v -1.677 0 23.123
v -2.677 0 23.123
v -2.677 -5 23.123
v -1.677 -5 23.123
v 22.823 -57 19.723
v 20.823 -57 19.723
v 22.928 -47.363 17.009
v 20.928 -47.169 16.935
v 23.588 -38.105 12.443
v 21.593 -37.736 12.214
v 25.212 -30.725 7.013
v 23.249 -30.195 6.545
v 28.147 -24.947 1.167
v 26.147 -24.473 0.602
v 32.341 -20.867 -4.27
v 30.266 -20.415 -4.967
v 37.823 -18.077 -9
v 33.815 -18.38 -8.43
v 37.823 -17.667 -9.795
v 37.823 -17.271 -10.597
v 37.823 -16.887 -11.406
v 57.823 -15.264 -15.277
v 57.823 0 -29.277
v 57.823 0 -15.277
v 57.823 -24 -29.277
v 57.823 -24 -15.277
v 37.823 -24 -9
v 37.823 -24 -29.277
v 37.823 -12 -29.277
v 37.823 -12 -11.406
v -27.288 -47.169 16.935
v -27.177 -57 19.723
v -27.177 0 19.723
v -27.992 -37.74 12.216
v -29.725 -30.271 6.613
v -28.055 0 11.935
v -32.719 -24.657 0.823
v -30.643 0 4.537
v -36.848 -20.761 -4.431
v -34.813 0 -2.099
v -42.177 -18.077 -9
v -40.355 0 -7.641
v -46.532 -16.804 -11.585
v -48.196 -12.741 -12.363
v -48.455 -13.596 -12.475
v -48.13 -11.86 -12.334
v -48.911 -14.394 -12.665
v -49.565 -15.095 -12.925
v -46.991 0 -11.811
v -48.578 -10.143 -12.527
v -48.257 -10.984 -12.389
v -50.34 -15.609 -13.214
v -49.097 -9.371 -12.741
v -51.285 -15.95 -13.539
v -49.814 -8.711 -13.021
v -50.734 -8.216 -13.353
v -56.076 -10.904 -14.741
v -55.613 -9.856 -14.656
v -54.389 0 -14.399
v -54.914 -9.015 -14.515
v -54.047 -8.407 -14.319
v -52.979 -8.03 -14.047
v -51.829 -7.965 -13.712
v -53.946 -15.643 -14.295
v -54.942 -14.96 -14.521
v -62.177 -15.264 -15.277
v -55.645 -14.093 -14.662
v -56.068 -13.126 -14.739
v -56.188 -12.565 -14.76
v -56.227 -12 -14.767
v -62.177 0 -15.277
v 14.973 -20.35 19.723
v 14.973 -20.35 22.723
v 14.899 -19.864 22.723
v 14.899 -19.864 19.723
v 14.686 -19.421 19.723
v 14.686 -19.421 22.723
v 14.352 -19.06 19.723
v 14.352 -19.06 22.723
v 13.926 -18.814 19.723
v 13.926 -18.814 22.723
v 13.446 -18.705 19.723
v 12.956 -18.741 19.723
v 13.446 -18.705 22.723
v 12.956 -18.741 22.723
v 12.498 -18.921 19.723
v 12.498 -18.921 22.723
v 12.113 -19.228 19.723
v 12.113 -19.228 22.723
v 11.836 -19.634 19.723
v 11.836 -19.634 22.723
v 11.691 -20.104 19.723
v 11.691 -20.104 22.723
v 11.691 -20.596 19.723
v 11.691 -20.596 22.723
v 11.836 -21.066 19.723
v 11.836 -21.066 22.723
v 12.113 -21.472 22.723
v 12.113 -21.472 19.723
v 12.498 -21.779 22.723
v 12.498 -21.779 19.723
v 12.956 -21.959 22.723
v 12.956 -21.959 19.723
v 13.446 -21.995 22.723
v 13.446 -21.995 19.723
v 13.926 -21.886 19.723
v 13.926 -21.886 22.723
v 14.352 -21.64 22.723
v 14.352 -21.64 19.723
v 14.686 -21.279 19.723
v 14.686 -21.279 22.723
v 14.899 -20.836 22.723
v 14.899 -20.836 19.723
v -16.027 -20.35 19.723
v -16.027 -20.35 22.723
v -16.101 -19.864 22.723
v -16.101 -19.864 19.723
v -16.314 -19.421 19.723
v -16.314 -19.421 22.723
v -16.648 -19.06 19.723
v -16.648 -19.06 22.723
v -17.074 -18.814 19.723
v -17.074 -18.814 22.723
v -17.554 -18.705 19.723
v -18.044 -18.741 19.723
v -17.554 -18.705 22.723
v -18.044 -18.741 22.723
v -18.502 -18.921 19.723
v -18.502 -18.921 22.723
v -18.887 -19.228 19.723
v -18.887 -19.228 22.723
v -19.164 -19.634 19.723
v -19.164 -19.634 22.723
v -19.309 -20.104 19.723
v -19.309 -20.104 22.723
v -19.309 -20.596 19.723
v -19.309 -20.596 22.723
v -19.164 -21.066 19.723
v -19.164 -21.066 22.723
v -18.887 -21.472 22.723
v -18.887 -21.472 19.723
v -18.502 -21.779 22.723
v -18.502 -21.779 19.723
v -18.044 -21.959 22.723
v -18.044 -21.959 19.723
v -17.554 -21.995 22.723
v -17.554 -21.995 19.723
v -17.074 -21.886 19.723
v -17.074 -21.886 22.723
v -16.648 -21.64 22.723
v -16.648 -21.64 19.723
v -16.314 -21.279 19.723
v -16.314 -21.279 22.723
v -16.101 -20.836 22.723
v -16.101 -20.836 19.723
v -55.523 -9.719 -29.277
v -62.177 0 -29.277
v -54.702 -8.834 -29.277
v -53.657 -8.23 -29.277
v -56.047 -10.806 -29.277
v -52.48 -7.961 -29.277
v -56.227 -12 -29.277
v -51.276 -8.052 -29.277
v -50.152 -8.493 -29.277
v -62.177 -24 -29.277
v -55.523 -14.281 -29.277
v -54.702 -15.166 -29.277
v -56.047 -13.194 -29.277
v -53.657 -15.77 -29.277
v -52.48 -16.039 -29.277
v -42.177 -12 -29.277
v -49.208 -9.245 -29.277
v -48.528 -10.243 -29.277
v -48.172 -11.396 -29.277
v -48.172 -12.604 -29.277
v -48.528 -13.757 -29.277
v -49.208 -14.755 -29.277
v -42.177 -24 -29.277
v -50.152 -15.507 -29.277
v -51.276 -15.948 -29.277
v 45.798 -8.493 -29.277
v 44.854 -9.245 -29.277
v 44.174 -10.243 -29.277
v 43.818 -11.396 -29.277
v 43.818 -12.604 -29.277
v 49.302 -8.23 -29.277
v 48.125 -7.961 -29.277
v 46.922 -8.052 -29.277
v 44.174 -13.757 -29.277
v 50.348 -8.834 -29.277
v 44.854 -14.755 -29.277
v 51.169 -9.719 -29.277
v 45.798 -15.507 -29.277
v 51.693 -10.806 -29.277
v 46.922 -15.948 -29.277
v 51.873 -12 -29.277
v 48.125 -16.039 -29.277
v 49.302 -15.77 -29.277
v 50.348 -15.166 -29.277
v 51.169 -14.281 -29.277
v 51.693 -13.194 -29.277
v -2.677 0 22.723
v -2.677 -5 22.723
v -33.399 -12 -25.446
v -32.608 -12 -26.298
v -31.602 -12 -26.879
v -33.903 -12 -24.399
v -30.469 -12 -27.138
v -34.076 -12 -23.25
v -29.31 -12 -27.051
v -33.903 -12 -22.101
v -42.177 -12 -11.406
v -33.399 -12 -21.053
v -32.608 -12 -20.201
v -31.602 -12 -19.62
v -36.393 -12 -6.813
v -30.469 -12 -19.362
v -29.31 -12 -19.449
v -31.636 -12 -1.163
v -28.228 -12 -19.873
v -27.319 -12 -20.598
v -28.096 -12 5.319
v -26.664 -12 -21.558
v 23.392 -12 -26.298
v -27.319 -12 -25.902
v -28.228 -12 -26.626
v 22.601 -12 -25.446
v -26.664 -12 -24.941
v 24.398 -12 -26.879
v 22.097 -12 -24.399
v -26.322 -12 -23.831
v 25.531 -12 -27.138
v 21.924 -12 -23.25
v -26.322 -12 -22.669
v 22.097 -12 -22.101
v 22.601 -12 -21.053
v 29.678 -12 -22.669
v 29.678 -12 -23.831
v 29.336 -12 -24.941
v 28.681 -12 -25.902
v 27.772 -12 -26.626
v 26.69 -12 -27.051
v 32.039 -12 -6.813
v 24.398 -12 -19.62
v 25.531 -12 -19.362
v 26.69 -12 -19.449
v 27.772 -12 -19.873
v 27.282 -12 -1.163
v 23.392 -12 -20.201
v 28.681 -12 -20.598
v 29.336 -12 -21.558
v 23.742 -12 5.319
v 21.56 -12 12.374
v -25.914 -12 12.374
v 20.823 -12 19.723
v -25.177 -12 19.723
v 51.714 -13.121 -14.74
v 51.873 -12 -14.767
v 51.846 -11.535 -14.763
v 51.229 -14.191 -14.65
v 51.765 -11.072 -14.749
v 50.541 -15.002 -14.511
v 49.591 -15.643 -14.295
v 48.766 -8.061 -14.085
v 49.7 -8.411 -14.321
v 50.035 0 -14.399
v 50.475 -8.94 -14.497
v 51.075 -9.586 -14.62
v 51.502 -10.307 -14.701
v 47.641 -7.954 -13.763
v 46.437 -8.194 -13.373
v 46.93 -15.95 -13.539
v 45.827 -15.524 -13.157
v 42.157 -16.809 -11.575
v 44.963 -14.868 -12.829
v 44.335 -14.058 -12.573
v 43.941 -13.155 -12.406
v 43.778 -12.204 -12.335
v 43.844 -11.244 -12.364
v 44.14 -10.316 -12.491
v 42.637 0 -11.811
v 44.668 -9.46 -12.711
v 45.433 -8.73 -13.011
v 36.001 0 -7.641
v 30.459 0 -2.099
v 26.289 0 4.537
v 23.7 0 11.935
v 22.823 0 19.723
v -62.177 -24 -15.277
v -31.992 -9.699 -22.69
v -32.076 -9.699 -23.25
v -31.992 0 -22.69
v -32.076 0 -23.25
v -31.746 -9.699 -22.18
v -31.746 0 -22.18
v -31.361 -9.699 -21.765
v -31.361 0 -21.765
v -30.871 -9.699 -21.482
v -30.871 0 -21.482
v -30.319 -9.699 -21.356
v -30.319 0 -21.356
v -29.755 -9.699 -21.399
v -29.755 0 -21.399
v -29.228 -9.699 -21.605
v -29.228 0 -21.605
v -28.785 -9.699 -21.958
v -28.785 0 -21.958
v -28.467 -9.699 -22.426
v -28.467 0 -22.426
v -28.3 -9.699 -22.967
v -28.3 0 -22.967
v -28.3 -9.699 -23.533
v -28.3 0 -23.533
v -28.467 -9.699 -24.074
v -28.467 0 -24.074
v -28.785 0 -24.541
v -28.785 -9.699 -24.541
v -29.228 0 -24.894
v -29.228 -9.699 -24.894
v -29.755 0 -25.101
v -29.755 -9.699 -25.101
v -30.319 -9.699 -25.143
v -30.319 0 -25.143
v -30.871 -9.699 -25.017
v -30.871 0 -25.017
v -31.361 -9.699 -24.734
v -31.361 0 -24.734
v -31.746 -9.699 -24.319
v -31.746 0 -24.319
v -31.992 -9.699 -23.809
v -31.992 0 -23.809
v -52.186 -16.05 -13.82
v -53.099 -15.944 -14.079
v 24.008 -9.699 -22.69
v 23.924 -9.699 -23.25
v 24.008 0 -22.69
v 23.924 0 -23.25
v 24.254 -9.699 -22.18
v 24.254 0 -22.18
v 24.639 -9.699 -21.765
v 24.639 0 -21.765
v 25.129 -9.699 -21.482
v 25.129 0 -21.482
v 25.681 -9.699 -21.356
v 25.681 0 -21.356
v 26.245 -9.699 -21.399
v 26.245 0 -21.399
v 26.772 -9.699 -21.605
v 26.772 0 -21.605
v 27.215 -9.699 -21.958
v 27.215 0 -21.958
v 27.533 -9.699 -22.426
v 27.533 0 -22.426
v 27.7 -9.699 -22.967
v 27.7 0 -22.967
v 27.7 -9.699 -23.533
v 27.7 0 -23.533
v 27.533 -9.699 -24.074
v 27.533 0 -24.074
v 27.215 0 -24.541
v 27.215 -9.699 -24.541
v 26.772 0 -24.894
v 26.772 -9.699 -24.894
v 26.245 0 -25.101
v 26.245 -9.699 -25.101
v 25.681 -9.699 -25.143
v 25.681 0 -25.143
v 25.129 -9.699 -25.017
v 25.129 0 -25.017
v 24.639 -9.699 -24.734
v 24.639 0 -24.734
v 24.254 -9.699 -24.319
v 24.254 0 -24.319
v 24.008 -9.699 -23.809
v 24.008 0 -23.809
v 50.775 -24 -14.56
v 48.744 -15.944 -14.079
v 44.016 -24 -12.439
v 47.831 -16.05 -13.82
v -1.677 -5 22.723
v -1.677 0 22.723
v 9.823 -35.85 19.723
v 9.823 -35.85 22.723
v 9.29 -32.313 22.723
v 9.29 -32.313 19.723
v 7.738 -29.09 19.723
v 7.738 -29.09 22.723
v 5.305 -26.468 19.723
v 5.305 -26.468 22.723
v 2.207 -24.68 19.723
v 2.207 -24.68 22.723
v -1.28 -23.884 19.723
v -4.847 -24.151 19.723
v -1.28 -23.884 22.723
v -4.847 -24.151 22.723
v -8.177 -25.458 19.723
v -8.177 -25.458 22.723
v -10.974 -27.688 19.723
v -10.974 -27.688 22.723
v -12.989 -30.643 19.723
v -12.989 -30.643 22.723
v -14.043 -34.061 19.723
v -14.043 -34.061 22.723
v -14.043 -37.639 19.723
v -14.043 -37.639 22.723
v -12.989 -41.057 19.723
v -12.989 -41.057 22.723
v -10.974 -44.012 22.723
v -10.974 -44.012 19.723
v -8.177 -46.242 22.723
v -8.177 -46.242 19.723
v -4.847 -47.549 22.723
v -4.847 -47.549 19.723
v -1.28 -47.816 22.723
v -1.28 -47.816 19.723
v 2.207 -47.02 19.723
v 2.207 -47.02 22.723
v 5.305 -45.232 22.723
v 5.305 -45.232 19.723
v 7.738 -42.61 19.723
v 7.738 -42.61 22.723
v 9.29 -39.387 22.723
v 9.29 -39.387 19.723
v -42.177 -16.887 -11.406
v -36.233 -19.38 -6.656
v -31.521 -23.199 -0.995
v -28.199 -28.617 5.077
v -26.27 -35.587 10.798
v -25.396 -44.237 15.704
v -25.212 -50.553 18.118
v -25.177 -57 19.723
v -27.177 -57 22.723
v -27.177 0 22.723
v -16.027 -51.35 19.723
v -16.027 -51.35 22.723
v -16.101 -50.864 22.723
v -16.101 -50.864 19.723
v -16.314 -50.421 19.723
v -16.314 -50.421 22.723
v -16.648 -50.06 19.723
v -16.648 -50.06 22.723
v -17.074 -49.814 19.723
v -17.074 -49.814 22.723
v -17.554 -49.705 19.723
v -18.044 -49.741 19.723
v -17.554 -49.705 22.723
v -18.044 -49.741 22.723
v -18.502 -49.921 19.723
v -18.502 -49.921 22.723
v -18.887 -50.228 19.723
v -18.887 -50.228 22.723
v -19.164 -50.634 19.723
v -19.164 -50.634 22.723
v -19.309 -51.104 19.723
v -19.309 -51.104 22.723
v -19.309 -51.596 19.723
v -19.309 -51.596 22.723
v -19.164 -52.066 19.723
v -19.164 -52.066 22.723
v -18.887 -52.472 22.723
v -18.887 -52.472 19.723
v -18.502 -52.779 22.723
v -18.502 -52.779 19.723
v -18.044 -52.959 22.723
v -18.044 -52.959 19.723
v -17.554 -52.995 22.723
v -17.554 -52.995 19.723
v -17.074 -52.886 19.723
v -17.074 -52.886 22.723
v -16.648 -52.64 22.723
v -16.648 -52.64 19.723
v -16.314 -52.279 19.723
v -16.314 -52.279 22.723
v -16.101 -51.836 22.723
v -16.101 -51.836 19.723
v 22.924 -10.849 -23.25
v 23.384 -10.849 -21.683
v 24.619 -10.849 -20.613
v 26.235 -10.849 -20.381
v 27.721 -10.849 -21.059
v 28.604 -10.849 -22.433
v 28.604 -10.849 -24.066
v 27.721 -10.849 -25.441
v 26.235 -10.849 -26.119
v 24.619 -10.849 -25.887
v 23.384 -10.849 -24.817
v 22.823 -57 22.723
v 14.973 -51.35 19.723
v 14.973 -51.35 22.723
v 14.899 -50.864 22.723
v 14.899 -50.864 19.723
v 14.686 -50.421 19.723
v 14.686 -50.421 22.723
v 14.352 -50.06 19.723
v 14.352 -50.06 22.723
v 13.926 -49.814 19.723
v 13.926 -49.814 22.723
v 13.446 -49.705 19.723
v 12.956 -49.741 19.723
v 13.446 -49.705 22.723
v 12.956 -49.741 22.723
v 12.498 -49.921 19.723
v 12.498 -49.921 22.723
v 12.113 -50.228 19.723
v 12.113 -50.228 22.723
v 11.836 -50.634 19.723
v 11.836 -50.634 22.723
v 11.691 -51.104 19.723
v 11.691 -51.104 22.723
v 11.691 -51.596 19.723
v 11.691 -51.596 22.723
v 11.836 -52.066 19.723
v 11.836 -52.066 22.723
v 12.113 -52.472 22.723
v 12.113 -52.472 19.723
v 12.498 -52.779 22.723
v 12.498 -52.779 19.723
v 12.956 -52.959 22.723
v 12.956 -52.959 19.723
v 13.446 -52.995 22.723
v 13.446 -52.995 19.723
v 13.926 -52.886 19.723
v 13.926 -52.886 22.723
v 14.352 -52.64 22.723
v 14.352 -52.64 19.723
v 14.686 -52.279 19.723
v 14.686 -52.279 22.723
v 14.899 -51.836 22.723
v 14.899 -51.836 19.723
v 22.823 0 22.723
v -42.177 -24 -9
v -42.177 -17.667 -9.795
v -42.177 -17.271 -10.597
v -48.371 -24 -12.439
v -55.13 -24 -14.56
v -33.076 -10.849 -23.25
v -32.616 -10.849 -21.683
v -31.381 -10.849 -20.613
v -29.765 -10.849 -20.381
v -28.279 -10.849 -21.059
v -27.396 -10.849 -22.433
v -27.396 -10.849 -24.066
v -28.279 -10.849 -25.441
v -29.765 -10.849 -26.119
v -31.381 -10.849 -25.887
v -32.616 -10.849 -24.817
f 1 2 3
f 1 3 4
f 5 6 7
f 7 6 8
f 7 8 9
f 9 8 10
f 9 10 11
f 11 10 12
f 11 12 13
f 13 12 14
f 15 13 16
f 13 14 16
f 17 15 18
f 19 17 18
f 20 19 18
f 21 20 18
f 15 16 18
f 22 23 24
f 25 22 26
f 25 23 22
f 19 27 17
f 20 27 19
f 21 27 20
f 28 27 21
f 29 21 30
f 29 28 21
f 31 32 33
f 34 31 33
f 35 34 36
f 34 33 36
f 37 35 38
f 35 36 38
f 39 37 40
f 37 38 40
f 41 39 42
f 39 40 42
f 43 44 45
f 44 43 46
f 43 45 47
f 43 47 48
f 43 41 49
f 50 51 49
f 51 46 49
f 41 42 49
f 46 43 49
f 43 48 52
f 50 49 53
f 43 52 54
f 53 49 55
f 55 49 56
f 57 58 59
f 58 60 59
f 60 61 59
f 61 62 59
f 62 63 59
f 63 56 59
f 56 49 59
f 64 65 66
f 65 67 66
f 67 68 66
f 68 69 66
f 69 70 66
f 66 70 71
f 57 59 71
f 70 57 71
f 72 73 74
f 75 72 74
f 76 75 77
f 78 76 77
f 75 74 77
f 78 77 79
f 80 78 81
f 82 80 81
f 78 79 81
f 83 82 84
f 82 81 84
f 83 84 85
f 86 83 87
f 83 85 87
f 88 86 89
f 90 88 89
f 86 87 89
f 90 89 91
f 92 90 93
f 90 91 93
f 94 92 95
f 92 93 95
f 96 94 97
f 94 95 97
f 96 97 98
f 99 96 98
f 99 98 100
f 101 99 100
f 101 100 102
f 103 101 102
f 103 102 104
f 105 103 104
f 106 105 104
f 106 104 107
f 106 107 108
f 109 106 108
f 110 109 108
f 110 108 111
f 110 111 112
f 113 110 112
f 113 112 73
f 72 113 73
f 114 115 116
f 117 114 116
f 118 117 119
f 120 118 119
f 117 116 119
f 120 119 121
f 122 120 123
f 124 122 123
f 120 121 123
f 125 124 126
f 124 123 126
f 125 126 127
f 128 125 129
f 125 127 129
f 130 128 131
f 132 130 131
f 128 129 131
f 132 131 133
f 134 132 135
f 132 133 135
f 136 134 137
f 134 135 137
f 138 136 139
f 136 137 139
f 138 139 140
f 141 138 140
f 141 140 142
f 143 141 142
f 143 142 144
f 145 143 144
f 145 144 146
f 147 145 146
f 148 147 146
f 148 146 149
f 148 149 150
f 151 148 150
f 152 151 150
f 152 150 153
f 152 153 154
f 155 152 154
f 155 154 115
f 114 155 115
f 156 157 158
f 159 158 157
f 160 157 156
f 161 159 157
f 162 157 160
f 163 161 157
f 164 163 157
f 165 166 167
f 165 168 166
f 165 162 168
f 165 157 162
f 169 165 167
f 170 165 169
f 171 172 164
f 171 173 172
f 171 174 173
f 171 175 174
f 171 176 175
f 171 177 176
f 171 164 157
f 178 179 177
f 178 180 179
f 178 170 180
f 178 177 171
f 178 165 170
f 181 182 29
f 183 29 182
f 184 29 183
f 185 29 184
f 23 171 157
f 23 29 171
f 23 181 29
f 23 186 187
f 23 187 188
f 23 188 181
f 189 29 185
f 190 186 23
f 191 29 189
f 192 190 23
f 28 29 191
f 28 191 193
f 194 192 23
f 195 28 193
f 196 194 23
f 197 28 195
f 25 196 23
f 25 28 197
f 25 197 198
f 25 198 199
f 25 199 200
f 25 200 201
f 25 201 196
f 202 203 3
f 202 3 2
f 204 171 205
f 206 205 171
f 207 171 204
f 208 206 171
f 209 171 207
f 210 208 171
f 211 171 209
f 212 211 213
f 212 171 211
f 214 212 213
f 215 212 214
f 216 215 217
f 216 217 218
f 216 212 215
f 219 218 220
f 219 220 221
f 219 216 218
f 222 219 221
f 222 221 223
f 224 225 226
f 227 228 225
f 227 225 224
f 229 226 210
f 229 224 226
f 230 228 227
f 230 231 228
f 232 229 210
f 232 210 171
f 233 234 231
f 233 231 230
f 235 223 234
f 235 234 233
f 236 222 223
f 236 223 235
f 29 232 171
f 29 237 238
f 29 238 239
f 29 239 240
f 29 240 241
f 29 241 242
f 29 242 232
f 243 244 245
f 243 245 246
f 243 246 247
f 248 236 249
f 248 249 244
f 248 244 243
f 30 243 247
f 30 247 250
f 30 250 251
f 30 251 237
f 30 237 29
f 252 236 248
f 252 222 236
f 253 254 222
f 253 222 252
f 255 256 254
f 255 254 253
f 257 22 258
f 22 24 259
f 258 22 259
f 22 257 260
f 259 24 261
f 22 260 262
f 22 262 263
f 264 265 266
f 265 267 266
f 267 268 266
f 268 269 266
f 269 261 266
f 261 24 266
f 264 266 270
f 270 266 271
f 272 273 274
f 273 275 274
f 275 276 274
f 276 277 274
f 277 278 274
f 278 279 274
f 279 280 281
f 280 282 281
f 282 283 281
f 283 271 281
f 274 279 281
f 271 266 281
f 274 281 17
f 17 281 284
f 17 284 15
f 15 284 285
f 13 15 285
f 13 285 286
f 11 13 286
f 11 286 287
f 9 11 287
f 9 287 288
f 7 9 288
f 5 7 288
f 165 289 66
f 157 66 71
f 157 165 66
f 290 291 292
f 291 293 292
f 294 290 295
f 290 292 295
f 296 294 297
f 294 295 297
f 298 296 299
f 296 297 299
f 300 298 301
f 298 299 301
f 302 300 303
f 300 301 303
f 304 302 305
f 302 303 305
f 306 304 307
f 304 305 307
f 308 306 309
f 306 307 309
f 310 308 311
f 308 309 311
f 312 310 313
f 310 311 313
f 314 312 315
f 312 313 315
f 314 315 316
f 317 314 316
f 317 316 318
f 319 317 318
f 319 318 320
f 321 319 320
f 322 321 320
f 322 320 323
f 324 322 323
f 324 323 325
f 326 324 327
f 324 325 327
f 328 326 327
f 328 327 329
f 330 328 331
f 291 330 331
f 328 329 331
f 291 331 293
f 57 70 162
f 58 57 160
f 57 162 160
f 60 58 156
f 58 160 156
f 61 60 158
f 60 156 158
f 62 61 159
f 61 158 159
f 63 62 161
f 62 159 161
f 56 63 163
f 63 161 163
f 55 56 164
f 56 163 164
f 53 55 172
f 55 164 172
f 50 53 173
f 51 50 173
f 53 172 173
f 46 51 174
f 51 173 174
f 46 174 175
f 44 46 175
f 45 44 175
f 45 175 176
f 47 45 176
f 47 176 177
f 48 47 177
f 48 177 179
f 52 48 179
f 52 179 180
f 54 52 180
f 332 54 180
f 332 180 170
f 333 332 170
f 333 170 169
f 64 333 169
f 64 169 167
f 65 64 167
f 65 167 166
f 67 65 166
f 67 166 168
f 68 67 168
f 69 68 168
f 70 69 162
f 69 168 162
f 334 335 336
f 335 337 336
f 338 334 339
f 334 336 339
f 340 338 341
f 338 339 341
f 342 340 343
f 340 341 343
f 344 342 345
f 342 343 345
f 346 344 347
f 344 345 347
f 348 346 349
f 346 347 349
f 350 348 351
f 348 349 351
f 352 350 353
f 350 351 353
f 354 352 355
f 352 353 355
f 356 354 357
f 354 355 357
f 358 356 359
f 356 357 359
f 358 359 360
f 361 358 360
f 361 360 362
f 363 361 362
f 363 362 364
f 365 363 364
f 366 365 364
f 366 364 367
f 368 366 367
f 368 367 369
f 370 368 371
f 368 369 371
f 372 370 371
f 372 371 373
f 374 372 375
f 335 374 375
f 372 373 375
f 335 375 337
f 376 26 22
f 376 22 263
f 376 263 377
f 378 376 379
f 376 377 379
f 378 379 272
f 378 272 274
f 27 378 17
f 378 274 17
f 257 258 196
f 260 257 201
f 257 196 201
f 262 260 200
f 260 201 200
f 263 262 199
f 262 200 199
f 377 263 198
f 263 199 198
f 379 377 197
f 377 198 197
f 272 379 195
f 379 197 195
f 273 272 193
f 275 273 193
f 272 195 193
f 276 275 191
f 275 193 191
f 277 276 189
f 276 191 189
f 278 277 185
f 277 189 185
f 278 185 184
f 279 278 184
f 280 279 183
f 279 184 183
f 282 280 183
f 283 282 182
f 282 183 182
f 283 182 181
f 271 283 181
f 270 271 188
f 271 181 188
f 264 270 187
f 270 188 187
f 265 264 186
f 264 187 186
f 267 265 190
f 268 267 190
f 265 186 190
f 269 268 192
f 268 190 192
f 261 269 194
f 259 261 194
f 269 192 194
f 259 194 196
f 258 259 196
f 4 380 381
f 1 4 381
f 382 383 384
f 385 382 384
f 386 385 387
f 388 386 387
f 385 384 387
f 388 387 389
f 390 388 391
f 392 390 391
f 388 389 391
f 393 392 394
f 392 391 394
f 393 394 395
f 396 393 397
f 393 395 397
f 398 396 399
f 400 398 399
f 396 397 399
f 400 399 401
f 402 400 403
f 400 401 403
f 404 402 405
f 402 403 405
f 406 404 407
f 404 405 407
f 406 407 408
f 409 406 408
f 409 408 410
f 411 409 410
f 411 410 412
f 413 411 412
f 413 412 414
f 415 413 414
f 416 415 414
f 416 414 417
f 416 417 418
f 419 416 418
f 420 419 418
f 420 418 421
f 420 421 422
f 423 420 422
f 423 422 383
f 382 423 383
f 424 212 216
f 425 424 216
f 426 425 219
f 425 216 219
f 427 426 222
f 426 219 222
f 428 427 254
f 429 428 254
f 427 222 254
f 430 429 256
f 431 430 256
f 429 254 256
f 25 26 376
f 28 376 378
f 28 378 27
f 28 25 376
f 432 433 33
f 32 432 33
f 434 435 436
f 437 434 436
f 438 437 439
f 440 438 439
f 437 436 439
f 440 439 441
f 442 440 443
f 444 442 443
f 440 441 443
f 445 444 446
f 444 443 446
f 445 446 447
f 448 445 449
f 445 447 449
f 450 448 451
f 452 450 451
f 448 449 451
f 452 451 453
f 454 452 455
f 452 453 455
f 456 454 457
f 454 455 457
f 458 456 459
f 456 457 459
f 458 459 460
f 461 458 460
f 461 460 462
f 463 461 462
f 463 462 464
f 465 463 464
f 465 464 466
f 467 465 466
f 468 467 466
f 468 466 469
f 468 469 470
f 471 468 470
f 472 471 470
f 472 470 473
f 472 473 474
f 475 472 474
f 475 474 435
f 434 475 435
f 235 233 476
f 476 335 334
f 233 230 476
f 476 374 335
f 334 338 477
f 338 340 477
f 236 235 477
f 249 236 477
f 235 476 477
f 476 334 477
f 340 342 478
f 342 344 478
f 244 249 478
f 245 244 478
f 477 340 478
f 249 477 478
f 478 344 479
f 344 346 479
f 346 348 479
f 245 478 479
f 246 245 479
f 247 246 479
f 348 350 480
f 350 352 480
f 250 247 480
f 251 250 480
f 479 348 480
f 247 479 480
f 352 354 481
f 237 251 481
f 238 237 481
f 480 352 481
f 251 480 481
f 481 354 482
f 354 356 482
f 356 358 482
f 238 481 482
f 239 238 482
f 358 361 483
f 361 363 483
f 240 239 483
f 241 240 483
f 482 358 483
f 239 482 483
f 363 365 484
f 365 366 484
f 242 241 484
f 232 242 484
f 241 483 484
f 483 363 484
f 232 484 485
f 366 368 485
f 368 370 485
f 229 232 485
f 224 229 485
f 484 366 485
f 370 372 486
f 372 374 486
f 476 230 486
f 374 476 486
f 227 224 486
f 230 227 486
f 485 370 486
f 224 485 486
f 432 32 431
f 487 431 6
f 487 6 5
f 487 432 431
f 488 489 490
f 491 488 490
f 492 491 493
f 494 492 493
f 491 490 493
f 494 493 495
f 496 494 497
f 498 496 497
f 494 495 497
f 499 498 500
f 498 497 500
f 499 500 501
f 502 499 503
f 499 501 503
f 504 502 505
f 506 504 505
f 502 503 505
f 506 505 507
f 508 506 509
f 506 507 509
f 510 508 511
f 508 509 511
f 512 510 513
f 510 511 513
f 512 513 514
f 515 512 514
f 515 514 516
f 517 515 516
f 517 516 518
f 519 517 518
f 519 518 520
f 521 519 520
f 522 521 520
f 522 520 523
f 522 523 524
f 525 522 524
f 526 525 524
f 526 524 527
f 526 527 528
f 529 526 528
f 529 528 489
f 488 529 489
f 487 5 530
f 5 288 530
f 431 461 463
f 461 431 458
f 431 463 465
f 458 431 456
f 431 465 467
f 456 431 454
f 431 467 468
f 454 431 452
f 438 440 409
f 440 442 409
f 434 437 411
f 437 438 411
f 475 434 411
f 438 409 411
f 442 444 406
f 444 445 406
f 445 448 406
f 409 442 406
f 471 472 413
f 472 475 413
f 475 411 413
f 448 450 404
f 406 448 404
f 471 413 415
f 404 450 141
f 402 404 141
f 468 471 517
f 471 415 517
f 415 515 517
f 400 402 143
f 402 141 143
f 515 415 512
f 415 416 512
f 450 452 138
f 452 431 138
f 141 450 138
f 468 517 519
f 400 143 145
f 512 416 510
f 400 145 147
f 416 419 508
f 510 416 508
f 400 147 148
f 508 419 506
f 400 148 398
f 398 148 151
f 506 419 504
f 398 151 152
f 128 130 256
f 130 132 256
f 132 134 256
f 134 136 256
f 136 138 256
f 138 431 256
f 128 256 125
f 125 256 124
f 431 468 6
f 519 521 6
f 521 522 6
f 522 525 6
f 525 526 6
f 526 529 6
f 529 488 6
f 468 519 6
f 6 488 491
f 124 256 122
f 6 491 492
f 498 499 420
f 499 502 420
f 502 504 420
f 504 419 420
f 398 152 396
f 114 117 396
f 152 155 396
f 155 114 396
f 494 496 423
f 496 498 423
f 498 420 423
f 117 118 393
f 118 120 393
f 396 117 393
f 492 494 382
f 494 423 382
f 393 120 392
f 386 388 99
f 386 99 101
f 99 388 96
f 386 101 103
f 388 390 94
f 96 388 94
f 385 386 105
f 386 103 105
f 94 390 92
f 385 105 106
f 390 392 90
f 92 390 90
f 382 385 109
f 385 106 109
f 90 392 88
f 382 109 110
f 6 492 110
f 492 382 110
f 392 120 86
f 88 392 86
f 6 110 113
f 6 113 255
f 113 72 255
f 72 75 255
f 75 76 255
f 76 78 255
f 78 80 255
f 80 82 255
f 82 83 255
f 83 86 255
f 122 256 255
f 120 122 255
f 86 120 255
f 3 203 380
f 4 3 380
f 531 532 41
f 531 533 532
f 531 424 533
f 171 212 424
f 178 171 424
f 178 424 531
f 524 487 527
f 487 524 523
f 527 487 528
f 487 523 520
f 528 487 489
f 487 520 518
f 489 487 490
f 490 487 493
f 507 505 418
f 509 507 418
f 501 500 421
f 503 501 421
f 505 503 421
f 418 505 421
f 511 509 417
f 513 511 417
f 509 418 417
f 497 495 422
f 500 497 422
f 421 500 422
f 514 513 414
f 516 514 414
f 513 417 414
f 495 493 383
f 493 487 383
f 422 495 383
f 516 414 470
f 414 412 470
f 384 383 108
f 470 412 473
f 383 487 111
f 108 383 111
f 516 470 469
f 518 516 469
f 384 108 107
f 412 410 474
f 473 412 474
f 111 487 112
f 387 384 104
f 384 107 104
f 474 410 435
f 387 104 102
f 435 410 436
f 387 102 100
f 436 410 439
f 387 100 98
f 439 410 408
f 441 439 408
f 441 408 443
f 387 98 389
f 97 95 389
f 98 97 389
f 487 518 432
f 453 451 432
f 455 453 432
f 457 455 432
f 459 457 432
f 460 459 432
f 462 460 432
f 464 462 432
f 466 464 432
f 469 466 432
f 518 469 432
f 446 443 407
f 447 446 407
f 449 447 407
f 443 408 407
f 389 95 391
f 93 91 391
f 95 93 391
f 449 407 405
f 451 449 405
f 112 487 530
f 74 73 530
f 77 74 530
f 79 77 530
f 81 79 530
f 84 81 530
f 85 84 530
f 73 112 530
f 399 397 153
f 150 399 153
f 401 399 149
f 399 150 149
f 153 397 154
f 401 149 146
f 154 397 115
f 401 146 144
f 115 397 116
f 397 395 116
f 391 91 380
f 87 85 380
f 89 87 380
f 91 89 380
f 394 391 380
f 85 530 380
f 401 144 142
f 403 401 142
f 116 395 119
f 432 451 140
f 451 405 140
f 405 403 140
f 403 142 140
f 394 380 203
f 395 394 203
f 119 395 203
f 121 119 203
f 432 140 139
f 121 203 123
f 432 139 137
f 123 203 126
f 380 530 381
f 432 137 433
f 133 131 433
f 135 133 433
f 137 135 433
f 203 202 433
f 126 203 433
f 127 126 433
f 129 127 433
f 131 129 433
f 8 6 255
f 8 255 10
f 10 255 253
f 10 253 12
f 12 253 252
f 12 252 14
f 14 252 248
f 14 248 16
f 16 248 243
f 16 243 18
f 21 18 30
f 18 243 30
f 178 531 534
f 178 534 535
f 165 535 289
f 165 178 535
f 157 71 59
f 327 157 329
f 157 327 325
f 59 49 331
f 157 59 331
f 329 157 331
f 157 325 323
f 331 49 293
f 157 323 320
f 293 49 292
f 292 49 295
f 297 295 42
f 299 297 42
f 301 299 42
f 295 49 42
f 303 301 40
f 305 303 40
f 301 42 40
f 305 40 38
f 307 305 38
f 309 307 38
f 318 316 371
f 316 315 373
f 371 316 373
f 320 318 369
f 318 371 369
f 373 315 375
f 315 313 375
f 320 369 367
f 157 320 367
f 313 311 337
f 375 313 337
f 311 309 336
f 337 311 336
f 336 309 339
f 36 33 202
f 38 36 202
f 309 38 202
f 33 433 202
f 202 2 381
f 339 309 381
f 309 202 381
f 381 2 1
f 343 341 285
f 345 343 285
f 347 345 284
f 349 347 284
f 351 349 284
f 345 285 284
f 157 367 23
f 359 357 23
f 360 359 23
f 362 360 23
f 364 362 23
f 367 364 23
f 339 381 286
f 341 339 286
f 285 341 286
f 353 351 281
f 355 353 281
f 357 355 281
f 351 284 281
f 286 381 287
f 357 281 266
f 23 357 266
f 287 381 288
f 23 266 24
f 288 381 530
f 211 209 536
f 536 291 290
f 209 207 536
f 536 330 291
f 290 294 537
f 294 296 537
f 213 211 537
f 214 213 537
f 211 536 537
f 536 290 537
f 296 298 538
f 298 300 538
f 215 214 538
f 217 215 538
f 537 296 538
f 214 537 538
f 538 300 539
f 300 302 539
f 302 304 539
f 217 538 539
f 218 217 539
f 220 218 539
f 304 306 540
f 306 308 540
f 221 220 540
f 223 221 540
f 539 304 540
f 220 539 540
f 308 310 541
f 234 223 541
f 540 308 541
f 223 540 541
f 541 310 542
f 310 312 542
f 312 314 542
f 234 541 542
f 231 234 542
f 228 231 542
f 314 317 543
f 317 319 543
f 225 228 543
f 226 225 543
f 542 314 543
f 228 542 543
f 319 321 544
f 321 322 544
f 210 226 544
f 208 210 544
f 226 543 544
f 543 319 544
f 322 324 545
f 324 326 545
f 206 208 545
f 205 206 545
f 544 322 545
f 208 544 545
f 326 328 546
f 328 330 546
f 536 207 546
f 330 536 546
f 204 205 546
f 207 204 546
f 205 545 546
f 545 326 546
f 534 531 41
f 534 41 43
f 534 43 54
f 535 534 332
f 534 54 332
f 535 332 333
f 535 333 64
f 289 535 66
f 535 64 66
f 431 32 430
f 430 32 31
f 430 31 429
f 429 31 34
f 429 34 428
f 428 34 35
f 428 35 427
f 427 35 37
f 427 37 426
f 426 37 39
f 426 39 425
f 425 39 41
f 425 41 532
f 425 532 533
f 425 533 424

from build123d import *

# Parameters (mm, degrees)
F0_W           = 50
F0_H           = 3
F1_DEPTH       = 12
F3_DEPTH       = 45
F5_DEPTH       = 120.001
F6_R           = 12
F6_R_2         = 1.65
F7_DEPTH       = 25
F9_D           = 3.7973
F9_CSINK_D     = 7.7978
F9_CSINK_ANGLE = 82
F10_W          = 1
F10_H          = 5
F11_DEPTH      = 0.4
F13_END_RADIUS = 35
F13_REACH      = 75.7248075794
F14_END_RADIUS = 35
F14_REACH      = 75.7248075794
F15_DEPTH      = 25


with BuildPart() as f1:
    # F0 (on Front) → F1 (new body)
    with BuildSketch(Plane.XZ):
        with BuildLine():
            Line((22.8227958083, 19.723181963), (-27.1772041917, 19.723181963))
            ThreePointArc((-27.1772041917, 19.723181963), (-37.4284668502, -5.0255553786), (-62.1772041917, -15.276818037))
            Line((-62.1772041917, -15.276818037), (-62.1772041917, -29.276818037))
            Line((-62.1772041917, -29.276818037), (57.8227958083, -29.276818037))
            Line((57.8227958083, -29.276818037), (57.8227958083, -15.276818037))
            ThreePointArc((57.8227958083, -15.276818037), (33.0740584668, -5.0255553786), (22.8227958083, 19.723181963))
        make_face()
        with Locations((-2.1772041917, 21.223181963)):
            Rectangle(F0_W, F0_H)
    extrude(amount=F1_DEPTH)

    # F2 (on face) → F3 (join)
    with BuildSketch(Plane.XZ.offset(12)):
        with BuildLine():
            Line((-25.1772041917, 19.723181963), (-27.1772041917, 19.723181963))
            ThreePointArc((-27.1772041917, 19.723181963), (-37.4284668502, -5.0255553786), (-62.1772041917, -15.276818037))
            Line((-62.1772041917, -15.276818037), (-62.1772041917, -29.276818037))
            Line((-62.1772041917, -29.276818037), (-60.1772041917, -29.276818037))
            Line((-60.1772041917, -29.276818037), (-60.1772041917, -17.2227244409))
            ThreePointArc((-60.1772041917, -17.2227244409), (-35.3164521546, -5.722839337), (-25.1772041917, 19.723181963))
        make_face()
        Polygon((-27.1772041917, 22.723181963), (-27.1772041917, 19.723181963), (-25.1772041917, 19.723181963), (20.8227958083, 19.723181963), (22.8227958083, 19.723181963), (22.8227958083, 22.723181963), align=None)
        with BuildLine():
            Line((22.8227958083, 19.723181963), (20.8227958083, 19.723181963))
            ThreePointArc((20.8227958083, 19.723181963), (30.9620437712, -5.722839337), (55.8227958083, -17.2227244409))
            Line((55.8227958083, -17.2227244409), (55.8227958083, -29.276818037))
            Line((55.8227958083, -29.276818037), (57.8227958083, -29.276818037))
            Line((57.8227958083, -29.276818037), (57.8227958083, -15.276818037))
            ThreePointArc((57.8227958083, -15.276818037), (33.0740584668, -5.0255553786), (22.8227958083, 19.723181963))
        make_face()
    extrude(amount=F3_DEPTH)

    # F4 (on face) → F5 (cut, through all)
    with BuildSketch(Plane(origin=(-62.1772041917, 0, 0), x_dir=(0, -1, 0), z_dir=(-1, 0, 0))):
        with BuildLine():
            Line((57, -15.276818037), (57, 19.723181963))
            ThreePointArc((57, 19.723181963), (26.3280584166, 2.7280262742), (12, -29.276818037))
            Line((12, -29.276818037), (57, -29.276818037))
            Line((57, -29.276818037), (57, -15.276818037))
        make_face()
    extrude(amount=-F5_DEPTH, mode=Mode.SUBTRACT)

    # F6 (on face) → F7 (cut)
    with BuildSketch(Plane.XY.offset(22.723181963)):
        with Locations((-2.1772041917, -35.85)):
            Circle(F6_R)
        with Locations((-17.6772041917, -51.35)):
            Circle(F6_R_2)
        with Locations((-17.6772041917, -20.35)):
            Circle(F6_R_2)
        with Locations((13.3227958083, -51.35)):
            Circle(F6_R_2)
        with Locations((13.3227958083, -20.35)):
            Circle(F6_R_2)
    extrude(amount=-F7_DEPTH, mode=Mode.SUBTRACT)

    # F9 (through all)
    with Locations(Plane.XZ.offset(12)):
        with Locations((-30.1772041917, -23.2497712389), (25.8227958083, -23.2497712389)):
            CounterSinkHole(F9_D / 2, F9_CSINK_D / 2, counter_sink_angle=F9_CSINK_ANGLE)

    # F10 (on face) → F11 (join)
    with BuildSketch(Plane.XY.offset(22.723181963)):
        with Locations((-2.1772041917, -2.5)):
            Rectangle(F10_W, F10_H)
    extrude(amount=F11_DEPTH)

    f13_end = (Plane(origin=(-62.1772041917, -28.5, 19.723181963), x_dir=(0, 0, 1), z_dir=(0, 1, 0)) * Cylinder(F13_END_RADIUS, 437.0700631752, mode=Mode.PRIVATE)).faces().sort_by_distance((-37.4284668502, -0.7549172174, -5.0255553786))[0]
    # F12 (on face) → F13 (join, up to the whole of a round face its end follows)
    with BuildSketch(Plane(origin=(0, 0, -29.276818037), x_dir=(1, 0, 0), z_dir=(0, 0, -1))):
        with BuildLine():
            Line((-62.1772041917, 24), (-62.1772041917, 12))
            Line((-62.1772041917, 12), (-60.1772041917, 12))
            Line((-60.1772041917, 12), (-56.2272041917, 12))
            ThreePointArc((-56.2272041917, 12), (-52.1772041917, 16.05), (-48.1272041917, 12))
            Line((-48.1272041917, 12), (-42.1772041917, 12))
            Line((-42.1772041917, 12), (-42.1772041917, 24))
            Line((-42.1772041917, 24), (-62.1772041917, 24))
        make_face()
        with BuildLine():
            Line((-56.2272041917, 12), (-48.1272041917, 12))
            ThreePointArc((-48.1272041917, 12), (-52.1772041917, 16.05), (-56.2272041917, 12))
        make_face()
    f13_long = extrude(amount=-F13_REACH, mode=Mode.PRIVATE)
    add(split(f13_long, bisect_by=f13_end, keep=Keep.TOP, mode=Mode.PRIVATE))

    f14_end = (Plane(origin=(57.8227958083, -28.5, 19.723181963), x_dir=(0, 0, 1), z_dir=(0, 1, 0)) * Cylinder(F14_END_RADIUS, 437.0700631752, mode=Mode.PRIVATE)).faces().sort_by_distance((33.0740584668, -0.7549172174, -5.0255553786))[0]
    # F12 (on face) → F14 (join, up to the whole of a round face its end follows)
    with BuildSketch(Plane(origin=(0, 0, -29.276818037), x_dir=(1, 0, 0), z_dir=(0, 0, -1))):
        with BuildLine():
            Line((37.8227958083, 24), (37.8227958083, 12))
            Line((37.8227958083, 12), (43.7727958083, 12))
            ThreePointArc((43.7727958083, 12), (47.8227958083, 16.05), (51.8727958083, 12))
            Line((51.8727958083, 12), (55.8227958083, 12))
            Line((55.8227958083, 12), (57.8227958083, 12))
            Line((57.8227958083, 12), (57.8227958083, 24))
            Line((57.8227958083, 24), (37.8227958083, 24))
        make_face()
        with BuildLine():
            Line((51.8727958083, 12), (43.7727958083, 12))
            ThreePointArc((43.7727958083, 12), (47.8227958083, 7.95), (51.8727958083, 12))
        make_face()
    f14_long = extrude(amount=-F14_REACH, mode=Mode.PRIVATE)
    add(split(f14_long, bisect_by=f14_end, keep=Keep.TOP, mode=Mode.PRIVATE))

    # F12 (on face) → F15 (cut)
    with BuildSketch(Plane(origin=(0, 0, -29.276818037), x_dir=(1, 0, 0), z_dir=(0, 0, -1))):
        with BuildLine():
            Line((-56.2272041917, 12), (-48.1272041917, 12))
            ThreePointArc((-48.1272041917, 12), (-52.1772041917, 16.05), (-56.2272041917, 12))
        make_face()
        with BuildLine():
            ThreePointArc((-56.2272041917, 12), (-52.1772041917, 7.95), (-48.1272041917, 12))
            Line((-48.1272041917, 12), (-56.2272041917, 12))
        make_face()
        with BuildLine():
            Line((51.8727958083, 12), (43.7727958083, 12))
            ThreePointArc((43.7727958083, 12), (47.8227958083, 7.95), (51.8727958083, 12))
        make_face()
        with BuildLine():
            ThreePointArc((51.8727958083, 12), (47.8227958083, 16.05), (43.7727958083, 12))
            Line((43.7727958083, 12), (51.8727958083, 12))
        make_face()
    extrude(amount=-F15_DEPTH, mode=Mode.SUBTRACT)


solid = f1.part
